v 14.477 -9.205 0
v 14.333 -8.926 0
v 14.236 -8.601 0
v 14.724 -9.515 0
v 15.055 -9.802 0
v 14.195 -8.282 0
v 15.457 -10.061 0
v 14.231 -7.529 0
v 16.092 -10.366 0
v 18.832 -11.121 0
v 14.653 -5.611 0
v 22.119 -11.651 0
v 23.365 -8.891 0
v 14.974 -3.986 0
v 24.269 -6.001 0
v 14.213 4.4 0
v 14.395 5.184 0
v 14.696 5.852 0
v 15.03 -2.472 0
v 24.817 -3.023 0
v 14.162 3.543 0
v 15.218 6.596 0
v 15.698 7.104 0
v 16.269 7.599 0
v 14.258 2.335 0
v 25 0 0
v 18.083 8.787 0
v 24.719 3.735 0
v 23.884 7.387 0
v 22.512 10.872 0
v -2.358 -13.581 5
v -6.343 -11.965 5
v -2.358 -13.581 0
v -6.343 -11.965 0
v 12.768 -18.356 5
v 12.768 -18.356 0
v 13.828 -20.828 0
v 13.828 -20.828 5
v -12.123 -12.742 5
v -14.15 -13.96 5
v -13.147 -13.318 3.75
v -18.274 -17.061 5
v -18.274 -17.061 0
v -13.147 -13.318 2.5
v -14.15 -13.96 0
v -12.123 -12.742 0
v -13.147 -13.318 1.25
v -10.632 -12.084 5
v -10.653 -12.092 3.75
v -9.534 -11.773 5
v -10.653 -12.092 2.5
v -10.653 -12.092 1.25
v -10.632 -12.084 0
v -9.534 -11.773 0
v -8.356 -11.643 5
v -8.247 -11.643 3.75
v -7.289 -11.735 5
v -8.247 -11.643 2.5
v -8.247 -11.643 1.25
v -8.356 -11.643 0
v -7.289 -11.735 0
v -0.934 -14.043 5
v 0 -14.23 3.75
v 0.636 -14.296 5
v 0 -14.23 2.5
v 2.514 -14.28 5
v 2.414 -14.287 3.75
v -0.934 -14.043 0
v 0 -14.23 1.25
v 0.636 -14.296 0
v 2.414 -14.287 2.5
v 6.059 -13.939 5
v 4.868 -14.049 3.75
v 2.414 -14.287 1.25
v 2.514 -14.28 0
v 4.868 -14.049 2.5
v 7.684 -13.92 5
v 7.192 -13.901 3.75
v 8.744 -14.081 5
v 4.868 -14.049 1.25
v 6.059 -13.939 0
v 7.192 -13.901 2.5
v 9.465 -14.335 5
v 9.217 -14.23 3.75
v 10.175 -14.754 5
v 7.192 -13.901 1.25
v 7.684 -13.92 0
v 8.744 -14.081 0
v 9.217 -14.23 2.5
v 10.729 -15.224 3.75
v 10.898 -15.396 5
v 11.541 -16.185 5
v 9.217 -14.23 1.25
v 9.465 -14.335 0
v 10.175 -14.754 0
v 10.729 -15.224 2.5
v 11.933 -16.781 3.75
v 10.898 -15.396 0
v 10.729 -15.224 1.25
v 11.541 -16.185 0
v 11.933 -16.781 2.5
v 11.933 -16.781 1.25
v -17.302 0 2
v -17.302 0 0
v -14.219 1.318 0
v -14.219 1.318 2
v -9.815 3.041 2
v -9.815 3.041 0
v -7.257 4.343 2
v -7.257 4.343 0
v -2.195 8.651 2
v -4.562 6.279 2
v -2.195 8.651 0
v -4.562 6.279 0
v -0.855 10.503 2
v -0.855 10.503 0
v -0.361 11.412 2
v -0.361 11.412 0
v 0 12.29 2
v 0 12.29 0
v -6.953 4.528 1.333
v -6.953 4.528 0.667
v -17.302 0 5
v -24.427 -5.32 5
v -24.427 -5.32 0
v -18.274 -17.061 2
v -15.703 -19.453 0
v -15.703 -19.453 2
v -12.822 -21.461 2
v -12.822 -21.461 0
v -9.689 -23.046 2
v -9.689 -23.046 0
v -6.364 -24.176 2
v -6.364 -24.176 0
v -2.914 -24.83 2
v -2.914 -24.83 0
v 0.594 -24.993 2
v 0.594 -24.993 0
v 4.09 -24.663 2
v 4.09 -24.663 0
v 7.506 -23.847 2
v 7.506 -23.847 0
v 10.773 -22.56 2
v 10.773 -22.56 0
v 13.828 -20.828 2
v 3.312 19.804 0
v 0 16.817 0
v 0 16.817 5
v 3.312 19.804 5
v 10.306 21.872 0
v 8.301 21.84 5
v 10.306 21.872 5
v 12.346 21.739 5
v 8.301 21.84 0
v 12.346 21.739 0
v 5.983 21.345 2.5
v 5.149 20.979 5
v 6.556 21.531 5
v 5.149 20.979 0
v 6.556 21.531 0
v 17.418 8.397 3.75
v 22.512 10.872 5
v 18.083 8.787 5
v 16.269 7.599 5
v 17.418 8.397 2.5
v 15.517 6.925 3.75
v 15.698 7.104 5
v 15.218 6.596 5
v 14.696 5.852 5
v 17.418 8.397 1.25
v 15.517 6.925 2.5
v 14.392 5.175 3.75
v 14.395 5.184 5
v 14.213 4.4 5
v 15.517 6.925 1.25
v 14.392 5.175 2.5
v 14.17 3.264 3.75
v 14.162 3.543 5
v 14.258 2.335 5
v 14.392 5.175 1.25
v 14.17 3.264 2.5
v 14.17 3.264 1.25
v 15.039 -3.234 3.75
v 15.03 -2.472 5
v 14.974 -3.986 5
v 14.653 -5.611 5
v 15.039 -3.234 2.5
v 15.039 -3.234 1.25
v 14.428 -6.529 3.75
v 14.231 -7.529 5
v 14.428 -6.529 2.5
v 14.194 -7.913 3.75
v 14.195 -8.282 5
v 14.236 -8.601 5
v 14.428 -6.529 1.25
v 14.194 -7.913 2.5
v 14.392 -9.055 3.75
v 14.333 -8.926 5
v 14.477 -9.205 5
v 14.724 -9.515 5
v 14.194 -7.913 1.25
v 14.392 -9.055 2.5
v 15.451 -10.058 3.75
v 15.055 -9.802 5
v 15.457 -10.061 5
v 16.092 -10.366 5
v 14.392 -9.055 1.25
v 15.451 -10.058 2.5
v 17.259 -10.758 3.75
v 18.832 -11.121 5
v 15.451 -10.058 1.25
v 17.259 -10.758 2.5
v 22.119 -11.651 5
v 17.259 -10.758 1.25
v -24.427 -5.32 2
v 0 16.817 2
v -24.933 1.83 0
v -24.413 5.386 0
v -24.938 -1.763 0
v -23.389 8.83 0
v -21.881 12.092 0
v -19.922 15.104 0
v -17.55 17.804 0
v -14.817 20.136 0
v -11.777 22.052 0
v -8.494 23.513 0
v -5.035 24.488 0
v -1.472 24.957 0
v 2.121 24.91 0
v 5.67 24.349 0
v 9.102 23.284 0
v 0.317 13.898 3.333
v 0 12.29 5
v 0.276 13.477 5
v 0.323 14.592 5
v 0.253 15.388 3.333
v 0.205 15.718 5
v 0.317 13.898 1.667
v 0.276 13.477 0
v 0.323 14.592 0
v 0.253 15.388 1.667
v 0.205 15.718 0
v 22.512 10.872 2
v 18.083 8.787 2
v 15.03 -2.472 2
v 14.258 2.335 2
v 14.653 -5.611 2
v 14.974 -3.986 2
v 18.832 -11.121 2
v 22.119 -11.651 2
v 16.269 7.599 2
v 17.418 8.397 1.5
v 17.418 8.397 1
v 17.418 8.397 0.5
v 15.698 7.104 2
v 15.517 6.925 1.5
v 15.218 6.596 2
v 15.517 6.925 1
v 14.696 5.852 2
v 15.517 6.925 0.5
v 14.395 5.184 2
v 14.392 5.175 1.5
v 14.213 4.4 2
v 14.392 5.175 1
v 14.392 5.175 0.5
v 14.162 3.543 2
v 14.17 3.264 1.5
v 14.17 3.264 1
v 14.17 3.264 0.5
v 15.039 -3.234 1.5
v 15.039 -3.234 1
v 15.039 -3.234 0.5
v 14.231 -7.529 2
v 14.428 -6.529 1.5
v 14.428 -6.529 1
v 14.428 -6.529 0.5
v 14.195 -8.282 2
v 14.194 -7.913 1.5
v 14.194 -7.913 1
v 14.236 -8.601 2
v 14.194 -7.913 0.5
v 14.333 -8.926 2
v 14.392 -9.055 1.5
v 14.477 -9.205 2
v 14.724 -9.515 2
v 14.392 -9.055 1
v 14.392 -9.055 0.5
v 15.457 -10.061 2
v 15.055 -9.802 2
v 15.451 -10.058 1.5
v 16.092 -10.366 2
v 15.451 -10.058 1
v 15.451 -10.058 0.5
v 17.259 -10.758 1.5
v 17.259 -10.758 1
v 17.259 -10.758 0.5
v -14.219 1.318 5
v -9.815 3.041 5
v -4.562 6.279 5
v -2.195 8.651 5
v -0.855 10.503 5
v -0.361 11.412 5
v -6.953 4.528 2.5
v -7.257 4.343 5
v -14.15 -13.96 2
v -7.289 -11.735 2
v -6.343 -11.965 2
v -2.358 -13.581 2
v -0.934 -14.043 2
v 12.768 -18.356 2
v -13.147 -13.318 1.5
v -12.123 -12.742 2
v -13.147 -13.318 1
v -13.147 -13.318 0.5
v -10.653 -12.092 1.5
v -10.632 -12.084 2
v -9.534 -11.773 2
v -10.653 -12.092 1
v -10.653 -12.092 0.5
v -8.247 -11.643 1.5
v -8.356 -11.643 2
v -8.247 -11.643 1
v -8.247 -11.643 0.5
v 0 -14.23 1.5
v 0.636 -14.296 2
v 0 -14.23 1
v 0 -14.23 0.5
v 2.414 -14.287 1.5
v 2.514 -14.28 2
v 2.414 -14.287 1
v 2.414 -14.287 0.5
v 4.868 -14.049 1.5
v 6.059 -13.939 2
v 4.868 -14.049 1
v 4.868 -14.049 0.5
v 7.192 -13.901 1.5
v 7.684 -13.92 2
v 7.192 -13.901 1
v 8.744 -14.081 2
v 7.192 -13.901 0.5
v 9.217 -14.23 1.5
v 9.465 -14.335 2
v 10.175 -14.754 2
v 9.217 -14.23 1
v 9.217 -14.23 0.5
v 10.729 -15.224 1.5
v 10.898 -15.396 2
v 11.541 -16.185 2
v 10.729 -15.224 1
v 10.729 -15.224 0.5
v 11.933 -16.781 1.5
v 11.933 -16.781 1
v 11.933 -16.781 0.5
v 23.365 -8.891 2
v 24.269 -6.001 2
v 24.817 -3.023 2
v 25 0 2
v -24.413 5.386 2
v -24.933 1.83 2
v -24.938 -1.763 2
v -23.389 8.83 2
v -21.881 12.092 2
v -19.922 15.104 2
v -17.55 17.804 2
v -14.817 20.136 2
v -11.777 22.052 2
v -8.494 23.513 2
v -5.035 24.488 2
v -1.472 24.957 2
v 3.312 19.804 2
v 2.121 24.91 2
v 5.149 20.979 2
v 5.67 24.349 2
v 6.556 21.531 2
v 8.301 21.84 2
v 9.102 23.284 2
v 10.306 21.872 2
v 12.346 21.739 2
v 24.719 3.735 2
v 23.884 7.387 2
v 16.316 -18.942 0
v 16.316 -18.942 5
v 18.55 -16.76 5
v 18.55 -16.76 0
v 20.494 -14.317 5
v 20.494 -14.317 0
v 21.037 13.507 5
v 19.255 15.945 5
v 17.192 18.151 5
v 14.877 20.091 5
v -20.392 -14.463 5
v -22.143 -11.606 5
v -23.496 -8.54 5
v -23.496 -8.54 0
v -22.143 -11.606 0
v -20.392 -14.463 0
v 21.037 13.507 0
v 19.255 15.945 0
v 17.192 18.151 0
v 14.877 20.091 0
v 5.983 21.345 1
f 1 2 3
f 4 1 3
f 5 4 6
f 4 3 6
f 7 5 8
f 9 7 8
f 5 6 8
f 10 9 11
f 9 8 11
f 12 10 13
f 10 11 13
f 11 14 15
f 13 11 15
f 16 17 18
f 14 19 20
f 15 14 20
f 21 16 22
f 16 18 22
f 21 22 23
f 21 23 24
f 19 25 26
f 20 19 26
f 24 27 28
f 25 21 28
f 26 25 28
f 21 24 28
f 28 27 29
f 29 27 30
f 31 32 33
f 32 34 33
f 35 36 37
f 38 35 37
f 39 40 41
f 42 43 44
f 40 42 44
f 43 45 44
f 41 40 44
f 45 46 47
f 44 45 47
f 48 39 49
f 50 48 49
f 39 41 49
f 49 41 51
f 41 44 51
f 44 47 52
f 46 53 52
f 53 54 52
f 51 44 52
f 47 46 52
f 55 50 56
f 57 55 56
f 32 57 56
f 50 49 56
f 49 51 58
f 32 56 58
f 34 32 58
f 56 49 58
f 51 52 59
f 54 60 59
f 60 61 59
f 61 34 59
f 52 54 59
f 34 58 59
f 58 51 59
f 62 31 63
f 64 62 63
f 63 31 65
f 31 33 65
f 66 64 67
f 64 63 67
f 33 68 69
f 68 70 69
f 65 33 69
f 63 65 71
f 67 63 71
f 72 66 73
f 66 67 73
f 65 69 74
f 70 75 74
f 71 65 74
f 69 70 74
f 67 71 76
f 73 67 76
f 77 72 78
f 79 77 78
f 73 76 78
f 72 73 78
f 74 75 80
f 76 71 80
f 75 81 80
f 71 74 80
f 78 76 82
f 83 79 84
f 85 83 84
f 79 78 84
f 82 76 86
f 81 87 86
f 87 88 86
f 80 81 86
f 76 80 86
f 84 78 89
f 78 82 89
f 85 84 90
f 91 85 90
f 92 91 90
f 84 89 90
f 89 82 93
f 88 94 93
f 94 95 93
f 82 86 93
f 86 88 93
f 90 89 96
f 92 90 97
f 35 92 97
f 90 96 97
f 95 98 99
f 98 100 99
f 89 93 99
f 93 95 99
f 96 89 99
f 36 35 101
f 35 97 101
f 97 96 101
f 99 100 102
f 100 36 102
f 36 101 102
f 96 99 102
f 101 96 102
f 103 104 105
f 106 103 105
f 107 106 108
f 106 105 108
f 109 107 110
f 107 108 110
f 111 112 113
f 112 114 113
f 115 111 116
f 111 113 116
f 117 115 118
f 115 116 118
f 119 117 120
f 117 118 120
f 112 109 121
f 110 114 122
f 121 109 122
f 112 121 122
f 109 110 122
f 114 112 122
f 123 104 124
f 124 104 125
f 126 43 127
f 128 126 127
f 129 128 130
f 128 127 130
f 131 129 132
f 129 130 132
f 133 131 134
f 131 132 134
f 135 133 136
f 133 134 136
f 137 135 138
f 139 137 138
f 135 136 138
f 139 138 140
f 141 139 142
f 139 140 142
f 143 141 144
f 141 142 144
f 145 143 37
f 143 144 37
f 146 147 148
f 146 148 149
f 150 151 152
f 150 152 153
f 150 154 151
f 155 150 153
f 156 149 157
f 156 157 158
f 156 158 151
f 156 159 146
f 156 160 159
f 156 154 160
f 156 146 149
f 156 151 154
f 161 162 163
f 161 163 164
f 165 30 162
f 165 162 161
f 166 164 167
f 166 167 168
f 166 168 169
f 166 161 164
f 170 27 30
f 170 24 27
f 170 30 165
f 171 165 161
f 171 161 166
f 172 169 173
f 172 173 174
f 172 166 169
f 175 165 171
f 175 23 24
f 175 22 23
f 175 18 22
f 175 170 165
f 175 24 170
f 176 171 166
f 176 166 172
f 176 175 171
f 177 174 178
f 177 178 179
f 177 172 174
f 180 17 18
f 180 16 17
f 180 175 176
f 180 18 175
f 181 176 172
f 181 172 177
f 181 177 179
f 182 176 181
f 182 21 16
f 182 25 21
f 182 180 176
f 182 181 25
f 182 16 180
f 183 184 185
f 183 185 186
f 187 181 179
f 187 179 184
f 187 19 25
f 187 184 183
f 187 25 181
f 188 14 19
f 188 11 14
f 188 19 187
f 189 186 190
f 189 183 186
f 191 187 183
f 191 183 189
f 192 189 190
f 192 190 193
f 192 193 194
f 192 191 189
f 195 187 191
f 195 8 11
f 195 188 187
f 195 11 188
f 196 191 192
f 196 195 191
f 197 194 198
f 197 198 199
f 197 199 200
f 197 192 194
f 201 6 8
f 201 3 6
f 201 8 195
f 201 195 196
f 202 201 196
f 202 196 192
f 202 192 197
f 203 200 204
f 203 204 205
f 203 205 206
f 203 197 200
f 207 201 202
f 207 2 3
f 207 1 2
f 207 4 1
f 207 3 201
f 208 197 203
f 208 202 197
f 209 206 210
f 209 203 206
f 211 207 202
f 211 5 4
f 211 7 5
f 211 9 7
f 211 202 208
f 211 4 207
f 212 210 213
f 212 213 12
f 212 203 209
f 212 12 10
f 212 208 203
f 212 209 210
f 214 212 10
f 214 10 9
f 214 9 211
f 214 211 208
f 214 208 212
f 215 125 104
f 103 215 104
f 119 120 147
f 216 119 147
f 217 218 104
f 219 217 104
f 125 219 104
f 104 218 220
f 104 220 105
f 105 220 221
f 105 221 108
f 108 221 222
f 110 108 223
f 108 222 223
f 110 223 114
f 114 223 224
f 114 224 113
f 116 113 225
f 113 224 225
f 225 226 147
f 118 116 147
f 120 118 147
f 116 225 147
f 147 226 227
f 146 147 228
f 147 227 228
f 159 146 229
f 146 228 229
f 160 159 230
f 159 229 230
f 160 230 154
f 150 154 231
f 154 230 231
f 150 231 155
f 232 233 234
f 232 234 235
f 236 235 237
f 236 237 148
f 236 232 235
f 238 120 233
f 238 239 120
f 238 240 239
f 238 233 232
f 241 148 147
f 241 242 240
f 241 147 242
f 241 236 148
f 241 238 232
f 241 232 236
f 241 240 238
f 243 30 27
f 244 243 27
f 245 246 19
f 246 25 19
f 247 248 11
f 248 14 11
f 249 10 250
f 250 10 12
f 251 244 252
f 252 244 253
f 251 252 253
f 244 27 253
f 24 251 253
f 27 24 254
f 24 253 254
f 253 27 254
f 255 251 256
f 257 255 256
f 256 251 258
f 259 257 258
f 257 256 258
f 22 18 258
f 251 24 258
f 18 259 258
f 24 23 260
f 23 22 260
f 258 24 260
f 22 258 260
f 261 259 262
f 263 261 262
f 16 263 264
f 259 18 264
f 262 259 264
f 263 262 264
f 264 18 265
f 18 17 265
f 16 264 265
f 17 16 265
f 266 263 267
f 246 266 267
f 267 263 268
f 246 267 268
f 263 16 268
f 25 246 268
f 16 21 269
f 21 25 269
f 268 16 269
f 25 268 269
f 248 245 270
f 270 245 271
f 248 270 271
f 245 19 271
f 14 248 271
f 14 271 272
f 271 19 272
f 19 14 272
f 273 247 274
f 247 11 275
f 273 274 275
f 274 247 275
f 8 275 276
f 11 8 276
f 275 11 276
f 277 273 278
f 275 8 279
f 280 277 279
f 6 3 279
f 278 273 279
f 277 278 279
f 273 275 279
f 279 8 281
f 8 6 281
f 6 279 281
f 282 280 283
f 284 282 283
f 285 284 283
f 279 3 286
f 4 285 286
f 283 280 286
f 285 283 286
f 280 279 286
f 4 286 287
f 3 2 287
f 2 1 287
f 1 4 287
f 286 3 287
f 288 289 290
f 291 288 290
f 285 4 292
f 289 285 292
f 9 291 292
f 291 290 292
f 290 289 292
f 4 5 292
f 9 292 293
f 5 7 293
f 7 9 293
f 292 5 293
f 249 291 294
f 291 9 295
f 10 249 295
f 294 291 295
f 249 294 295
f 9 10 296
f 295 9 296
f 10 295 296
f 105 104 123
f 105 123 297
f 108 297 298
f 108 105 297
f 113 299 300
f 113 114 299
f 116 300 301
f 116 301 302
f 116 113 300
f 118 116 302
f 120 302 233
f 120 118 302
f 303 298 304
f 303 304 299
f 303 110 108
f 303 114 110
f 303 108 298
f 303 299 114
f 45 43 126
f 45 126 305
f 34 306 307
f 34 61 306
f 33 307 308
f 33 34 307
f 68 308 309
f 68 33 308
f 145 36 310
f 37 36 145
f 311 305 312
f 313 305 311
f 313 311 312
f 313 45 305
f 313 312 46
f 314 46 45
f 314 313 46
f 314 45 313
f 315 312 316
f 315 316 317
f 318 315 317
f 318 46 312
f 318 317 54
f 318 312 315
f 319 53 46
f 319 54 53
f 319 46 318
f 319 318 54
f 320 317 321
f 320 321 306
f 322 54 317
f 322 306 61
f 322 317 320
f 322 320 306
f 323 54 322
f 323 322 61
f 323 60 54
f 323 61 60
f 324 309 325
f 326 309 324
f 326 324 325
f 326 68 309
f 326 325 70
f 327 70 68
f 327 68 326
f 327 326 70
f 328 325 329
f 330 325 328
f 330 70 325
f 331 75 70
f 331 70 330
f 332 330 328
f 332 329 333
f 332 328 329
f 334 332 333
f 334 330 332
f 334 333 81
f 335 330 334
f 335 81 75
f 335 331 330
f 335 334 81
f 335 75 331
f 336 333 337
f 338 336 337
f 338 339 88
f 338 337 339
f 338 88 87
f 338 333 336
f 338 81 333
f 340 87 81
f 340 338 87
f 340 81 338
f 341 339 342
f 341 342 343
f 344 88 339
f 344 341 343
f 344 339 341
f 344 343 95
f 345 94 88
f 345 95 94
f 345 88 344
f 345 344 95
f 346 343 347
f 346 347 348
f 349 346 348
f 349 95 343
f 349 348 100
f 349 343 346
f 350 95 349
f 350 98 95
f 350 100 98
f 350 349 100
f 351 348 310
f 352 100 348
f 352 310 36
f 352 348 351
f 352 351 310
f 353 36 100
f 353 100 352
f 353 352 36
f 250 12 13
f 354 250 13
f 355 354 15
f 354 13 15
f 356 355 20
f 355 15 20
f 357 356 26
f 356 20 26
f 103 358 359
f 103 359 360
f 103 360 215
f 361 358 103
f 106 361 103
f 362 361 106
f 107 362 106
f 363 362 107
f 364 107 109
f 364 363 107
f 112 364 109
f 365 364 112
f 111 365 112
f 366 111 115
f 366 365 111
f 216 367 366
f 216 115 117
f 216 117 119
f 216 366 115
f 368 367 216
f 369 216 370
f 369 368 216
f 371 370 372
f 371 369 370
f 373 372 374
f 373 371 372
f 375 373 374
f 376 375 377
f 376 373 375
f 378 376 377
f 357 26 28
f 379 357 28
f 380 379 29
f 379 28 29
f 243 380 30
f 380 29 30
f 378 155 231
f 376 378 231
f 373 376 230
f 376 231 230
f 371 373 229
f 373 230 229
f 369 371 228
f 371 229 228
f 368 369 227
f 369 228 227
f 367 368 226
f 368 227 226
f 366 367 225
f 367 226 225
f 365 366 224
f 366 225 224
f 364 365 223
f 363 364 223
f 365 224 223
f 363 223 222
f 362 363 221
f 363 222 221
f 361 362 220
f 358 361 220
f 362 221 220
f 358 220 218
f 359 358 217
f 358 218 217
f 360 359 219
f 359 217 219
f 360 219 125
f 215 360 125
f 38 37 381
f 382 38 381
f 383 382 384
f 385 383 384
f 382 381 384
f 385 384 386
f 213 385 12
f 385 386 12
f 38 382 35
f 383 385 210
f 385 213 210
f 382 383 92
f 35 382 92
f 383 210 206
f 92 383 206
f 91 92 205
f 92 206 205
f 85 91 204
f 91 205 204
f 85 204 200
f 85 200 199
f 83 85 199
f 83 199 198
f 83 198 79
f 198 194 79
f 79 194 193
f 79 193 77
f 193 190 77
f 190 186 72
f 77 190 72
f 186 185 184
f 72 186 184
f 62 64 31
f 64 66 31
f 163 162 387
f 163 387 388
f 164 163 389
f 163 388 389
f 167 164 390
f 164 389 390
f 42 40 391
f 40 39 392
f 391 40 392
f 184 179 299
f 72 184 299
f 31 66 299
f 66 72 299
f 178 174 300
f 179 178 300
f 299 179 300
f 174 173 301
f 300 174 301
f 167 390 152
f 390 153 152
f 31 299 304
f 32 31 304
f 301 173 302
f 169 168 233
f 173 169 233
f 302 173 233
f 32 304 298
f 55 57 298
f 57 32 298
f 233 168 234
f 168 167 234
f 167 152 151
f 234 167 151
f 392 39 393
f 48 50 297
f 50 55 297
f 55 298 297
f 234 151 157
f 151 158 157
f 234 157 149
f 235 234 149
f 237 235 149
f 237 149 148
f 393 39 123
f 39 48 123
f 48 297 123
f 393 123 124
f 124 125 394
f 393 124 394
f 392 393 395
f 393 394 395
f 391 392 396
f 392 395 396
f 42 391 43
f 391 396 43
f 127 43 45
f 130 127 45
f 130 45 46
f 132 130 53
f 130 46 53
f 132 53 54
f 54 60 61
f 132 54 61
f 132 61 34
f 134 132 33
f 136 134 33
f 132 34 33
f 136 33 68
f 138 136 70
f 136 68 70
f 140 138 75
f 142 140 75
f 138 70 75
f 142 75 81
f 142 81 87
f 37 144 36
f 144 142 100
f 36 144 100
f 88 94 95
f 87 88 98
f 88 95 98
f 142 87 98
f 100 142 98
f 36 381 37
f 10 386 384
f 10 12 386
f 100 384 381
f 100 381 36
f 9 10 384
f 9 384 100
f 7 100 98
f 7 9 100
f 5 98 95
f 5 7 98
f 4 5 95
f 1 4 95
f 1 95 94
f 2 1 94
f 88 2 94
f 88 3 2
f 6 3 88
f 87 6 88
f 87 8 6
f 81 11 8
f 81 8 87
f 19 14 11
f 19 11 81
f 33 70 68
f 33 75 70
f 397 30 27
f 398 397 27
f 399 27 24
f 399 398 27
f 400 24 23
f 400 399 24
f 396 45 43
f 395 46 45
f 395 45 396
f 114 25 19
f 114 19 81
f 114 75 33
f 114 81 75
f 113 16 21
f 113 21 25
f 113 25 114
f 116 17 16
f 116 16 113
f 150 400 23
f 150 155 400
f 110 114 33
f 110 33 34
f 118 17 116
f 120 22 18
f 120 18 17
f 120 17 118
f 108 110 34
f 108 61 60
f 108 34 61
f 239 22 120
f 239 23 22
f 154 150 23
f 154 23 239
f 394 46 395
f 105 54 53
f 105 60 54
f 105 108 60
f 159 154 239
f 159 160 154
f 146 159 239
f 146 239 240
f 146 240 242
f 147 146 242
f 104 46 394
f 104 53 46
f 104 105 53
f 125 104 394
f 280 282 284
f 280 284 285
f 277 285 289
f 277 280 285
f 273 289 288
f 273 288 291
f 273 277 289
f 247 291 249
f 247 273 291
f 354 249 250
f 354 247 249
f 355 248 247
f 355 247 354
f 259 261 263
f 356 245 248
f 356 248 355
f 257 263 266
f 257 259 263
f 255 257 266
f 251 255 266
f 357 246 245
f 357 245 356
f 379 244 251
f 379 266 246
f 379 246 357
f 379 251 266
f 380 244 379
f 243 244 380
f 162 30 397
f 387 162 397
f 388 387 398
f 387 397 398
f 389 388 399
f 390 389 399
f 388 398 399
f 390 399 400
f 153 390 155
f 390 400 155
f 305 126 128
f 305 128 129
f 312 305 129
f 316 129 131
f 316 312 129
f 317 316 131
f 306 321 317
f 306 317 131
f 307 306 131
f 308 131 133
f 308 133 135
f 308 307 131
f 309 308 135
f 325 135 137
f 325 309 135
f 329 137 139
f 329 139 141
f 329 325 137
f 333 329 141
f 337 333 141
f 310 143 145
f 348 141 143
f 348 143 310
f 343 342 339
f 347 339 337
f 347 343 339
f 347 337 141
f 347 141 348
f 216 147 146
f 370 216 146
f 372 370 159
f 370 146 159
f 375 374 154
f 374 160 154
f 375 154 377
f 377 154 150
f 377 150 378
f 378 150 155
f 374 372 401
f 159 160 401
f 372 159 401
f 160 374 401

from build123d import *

# Parameters (mm, degrees)
F1_DEPTH = 2
F2_DEPTH = 5


with BuildPart() as f1:
    # F0 (on Top) → F1 (new body)
    with BuildSketch(Plane.XY):
        with BuildLine():
            ThreePointArc((22.1188925873, -11.6513772023), (24.2690370089, -6.001153444), (25, 0))
            ThreePointArc((25, 0), (24.3701069704, 5.5765478793), (22.5121691, 10.8720854676))
            add(Edge.make_bspline(
                [(22.5121691, 10.8720854676), (18.8895611428, 9.3055197167), (11.9102659407, 6.2896821538), (16.4364178682, -3.0658471403), (12.2521680449, -10.2063529762), (18.6615851191, -11.1474987265), (22.1188925873, -11.6513772023)],
                knots=[0, 0, 0, 0, 0.2780136343, 0.5343531988, 0.7479805585, 1, 1, 1, 1], degree=3))
        make_face()
    extrude(amount=F1_DEPTH)


with BuildPart() as f1b:
    # F0 (on Top) → F1, piece 2 (new body)
    with BuildSketch(Plane.XY):
        with BuildLine():
            add(Edge.make_bspline(
                [(0, 16.8172493577), (1.9144161531, 18.6824676113), (5.5934798745, 22.2645311542), (10.1584208321, 21.9120162799), (12.34633467, 21.7386296766)],
                knots=[0, 0, 0, 0, 0.5203475383, 1, 1, 1, 1], degree=3))
            ThreePointArc((12.34633467, 21.7386296766), (-14.8165901958, 20.1362522573), (-24.4273769181, -5.3200805351))
            add(Edge.make_bspline(
                [(-24.4273769181, -5.3200805351), (-22.2453911763, -3.3574319676), (-20.0634054345, -1.3947834001), (-17.3023622483, 0)],
                knots=[0, 0, 0, 0, 0.254891956, 0.254891956, 0.254891956, 0.254891956], degree=3))
            add(Edge.make_bspline(
                [(-17.3023622483, 0), (-14.1903788127, 1.5720662607), (-6.6472654424, 3.2397841474), (-0.8648455283, 9.7284013886), (0, 12.2895278037)],
                knots=[0.254891956, 0.254891956, 0.254891956, 0.254891956, 0.542181756, 0.8181160828, 0.8181160828, 0.8181160828, 0.8181160828], degree=3))
            Line((0, 12.2895278037), (0, 16.8172493577))
        make_face()
        with BuildLine():
            add(Edge.make_bspline(
                [(-24.4273769181, -5.3200805351), (-22.2453911763, -3.3574319676), (-20.0634054345, -1.3947834001), (-17.3023622483, 0)],
                knots=[0, 0, 0, 0, 0.254891956, 0.254891956, 0.254891956, 0.254891956], degree=3))
            Line((-24.4273769181, -5.3200805351), (-17.3023622483, 0))
        make_face()
    extrude(amount=F1_DEPTH)


with BuildPart() as f1c:
    # F0 (on Top) → F1, piece 3 (new body)
    with BuildSketch(Plane.XY):
        with BuildLine():
            ThreePointArc((-18.2737018092, -17.0608271249), (-2.9135456355, -24.8296446175), (13.8278126154, -20.8276642539))
            add(Edge.make_bspline(
                [(-18.2737018092, -17.0608271249), (-14.8332101277, -14.3400323801), (-8.3808524987, -9.228978734), (-0.4412585546, -15.998889193), (10.2263751779, -12.0238586347), (12.6576888155, -17.9664290501), (13.8278126154, -20.8276642539)],
                knots=[0, 0, 0, 0, 0.2769679297, 0.5181649262, 0.767240907, 1, 1, 1, 1], degree=3))
        make_face()
    extrude(amount=F1_DEPTH)


with BuildPart() as f2:
    # F0 (on Top) → F2 (new body)
    with BuildSketch(Plane.XY):
        with BuildLine():
            add(Edge.make_bspline(
                [(22.5121691, 10.8720854676), (18.8895611428, 9.3055197167), (11.9102659407, 6.2896821538), (16.4364178682, -3.0658471403), (12.2521680449, -10.2063529762), (18.6615851191, -11.1474987265), (22.1188925873, -11.6513772023)],
                knots=[0, 0, 0, 0, 0.2780136343, 0.5343531988, 0.7479805585, 1, 1, 1, 1], degree=3))
            ThreePointArc((22.5121691, 10.8720854676), (18.2564856156, 17.0792486067), (12.34633467, 21.7386296766))
            add(Edge.make_bspline(
                [(0, 16.8172493577), (1.9144161531, 18.6824676113), (5.5934798745, 22.2645311542), (10.1584208321, 21.9120162799), (12.34633467, 21.7386296766)],
                knots=[0, 0, 0, 0, 0.5203475383, 1, 1, 1, 1], degree=3))
            add(Edge.make_bspline(
                [(0, 12.2895278037), (0.5700685894, 13.9777110398), (0.2850342947, 15.3974801988), (0, 16.8172493577)],
                knots=[0.8181160828, 0.8181160828, 0.8181160828, 0.8181160828, 1, 1, 1, 1], degree=3))
            add(Edge.make_bspline(
                [(-17.3023622483, 0), (-14.1903788127, 1.5720662607), (-6.6472654424, 3.2397841474), (-0.8648455283, 9.7284013886), (0, 12.2895278037)],
                knots=[0.254891956, 0.254891956, 0.254891956, 0.254891956, 0.542181756, 0.8181160828, 0.8181160828, 0.8181160828, 0.8181160828], degree=3))
            Line((-17.3023622483, 0), (-24.4273769181, -5.3200805351))
            ThreePointArc((-24.4273769181, -5.3200805351), (-22.1428727527, -11.6057393672), (-18.2737018092, -17.0608271249))
            add(Edge.make_bspline(
                [(-18.2737018092, -17.0608271249), (-14.8332101277, -14.3400323801), (-8.3808524987, -9.228978734), (-0.4412585546, -15.998889193), (10.2263751779, -12.0238586347), (12.6576888155, -17.9664290501), (13.8278126154, -20.8276642539)],
                knots=[0, 0, 0, 0, 0.2769679297, 0.5181649262, 0.767240907, 1, 1, 1, 1], degree=3))
            ThreePointArc((13.8278126154, -20.8276642539), (18.549729506, -16.7602963951), (22.1188925873, -11.6513772023))
        make_face()
    extrude(amount=F2_DEPTH)


solid = Compound([f1.part, f1b.part, f1c.part, f2.part])
